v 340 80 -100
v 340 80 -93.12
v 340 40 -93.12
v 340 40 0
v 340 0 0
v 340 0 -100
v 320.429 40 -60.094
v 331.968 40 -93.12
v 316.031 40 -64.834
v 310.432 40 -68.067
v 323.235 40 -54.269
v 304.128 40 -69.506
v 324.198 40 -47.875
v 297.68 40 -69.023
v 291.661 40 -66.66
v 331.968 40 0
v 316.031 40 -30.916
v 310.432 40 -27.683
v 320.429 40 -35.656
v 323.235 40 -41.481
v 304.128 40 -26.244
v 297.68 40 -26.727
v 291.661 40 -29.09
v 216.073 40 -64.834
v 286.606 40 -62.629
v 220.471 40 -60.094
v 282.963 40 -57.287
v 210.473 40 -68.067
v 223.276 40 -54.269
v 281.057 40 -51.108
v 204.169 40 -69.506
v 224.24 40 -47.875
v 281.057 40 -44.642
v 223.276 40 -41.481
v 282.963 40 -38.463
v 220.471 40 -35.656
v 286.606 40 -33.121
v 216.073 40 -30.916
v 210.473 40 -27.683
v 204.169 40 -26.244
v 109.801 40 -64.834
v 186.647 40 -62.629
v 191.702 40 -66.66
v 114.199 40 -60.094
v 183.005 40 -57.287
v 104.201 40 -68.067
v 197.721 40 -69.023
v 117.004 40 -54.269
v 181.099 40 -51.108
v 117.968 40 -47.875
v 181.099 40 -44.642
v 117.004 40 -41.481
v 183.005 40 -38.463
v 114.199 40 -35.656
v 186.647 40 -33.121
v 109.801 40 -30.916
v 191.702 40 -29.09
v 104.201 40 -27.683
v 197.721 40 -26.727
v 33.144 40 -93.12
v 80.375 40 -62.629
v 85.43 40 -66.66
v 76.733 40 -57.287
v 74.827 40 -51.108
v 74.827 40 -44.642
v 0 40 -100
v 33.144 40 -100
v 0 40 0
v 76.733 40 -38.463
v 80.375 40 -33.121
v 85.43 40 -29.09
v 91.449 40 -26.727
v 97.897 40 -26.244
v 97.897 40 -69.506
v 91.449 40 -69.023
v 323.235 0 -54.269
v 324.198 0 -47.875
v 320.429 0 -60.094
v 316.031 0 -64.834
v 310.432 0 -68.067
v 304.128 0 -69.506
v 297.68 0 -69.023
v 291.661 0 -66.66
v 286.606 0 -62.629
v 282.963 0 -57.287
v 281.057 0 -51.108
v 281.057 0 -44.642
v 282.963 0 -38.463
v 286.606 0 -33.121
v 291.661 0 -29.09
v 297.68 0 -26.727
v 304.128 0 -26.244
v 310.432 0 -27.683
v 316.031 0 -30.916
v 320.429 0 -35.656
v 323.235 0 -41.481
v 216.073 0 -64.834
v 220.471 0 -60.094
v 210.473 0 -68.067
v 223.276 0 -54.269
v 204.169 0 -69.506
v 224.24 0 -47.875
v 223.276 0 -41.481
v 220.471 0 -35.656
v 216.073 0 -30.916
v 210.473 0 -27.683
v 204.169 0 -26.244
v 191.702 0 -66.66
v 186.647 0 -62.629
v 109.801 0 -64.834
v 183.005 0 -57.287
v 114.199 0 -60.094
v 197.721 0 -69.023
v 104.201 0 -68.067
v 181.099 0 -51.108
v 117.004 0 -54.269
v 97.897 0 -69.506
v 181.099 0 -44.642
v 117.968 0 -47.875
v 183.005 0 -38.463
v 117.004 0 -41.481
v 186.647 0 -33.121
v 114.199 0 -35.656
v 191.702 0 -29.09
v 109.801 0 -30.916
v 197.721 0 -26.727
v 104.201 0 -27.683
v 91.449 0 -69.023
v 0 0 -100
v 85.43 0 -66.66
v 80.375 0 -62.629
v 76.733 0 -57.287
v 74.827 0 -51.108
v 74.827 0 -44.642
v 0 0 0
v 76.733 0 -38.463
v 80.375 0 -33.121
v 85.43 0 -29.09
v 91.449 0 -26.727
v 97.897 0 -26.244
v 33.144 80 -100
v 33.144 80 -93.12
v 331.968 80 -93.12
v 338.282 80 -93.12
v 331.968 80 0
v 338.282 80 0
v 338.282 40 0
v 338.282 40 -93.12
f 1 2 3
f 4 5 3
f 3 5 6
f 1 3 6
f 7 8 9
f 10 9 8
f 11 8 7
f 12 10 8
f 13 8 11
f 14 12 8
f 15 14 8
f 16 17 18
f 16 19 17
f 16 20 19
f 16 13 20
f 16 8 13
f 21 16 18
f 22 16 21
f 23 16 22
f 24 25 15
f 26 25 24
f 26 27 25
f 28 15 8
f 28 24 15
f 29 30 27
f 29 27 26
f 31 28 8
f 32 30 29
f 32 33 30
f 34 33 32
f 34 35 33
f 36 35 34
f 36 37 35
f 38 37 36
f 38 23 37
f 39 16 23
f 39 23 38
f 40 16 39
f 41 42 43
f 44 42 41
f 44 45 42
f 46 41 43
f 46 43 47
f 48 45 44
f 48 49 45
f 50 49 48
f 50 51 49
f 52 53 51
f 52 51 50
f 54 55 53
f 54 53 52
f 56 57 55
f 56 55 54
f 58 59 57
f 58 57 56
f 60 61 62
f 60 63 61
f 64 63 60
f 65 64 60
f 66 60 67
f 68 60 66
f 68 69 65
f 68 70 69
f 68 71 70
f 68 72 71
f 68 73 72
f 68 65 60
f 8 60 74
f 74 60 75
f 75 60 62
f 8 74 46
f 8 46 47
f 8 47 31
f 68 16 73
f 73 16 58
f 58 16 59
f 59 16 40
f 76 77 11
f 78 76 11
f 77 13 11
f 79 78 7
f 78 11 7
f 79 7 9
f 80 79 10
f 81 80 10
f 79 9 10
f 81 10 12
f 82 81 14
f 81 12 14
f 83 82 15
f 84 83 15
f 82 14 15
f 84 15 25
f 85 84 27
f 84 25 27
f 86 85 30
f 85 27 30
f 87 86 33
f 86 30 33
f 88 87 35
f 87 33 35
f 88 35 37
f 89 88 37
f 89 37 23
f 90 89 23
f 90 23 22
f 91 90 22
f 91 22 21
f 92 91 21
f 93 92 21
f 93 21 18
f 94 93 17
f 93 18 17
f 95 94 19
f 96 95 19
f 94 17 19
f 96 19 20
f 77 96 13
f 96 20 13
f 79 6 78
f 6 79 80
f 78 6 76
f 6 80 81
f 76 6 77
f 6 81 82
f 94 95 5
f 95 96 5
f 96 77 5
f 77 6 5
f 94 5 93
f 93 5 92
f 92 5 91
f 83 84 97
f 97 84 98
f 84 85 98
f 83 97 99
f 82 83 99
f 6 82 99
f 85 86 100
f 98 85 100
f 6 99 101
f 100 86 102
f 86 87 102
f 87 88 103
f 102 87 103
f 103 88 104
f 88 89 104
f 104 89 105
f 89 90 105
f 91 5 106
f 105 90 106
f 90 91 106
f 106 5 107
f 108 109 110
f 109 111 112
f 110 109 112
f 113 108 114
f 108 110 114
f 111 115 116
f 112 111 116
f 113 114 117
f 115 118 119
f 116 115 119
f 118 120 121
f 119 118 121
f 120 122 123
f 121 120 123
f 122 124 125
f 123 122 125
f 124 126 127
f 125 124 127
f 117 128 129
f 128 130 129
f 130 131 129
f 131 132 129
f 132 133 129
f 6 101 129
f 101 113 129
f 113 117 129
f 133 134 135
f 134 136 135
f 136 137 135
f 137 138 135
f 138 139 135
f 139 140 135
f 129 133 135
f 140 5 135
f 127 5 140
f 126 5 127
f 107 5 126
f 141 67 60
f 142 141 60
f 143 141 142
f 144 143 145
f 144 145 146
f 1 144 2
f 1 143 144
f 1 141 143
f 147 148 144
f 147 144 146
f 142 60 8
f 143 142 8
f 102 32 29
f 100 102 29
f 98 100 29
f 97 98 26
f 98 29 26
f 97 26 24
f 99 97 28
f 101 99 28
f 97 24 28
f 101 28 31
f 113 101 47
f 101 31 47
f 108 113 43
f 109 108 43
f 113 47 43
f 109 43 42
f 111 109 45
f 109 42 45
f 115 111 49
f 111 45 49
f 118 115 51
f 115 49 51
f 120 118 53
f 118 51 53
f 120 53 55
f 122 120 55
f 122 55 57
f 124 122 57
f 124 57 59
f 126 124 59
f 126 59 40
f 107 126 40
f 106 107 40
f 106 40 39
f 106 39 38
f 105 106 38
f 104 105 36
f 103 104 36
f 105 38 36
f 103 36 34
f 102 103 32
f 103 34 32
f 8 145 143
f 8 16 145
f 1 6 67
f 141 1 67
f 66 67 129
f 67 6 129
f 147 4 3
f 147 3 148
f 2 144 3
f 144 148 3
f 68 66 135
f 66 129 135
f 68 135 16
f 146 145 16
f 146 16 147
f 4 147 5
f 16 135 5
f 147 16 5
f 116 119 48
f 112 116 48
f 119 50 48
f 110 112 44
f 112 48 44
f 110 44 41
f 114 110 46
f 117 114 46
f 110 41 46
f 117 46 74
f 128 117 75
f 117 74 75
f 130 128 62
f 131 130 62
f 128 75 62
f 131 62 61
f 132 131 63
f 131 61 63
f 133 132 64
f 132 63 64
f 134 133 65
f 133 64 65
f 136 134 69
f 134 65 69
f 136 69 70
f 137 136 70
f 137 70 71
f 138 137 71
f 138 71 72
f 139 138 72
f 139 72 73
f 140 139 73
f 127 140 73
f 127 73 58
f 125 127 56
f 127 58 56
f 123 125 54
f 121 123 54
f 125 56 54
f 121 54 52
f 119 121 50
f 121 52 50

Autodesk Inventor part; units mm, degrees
ref_plane "YZ Plane" through (0, 0, 0) normal (1, 0, 0) x (0, 1, 0)
ref_plane "XZ Plane" through (0, 0, 0) normal (0, 1, 0) x (-1, 0, 0)
ref_plane "XY Plane" through (0, 0, 0) normal (0, 0, 1) x (1, 0, 0)
sketch "Sketch1" plane through (0, 0, 0) normal (0, 1, 0) x (-1, 0, 0)
  line L0 (0, 0) -> (-340, 0)
  line L1 (-340, 0) -> (-340, -100)
  line L2 (-340, -100) -> (0, -100)
  line L3 (0, -100) -> (0, 0)
  dimension "d0" = 340
  dimension "d1" = 100
extrude "Extrusion1" add sketch "Sketch1" along normal blind 40
sketch "Sketch2" plane through (0, 40, 0) normal (0, 1, 0) x (1, 0, 0)
  circle A0 centre (302.5068, 47.875) radius 21.6916
  circle A1 centre (202.5481, 47.875) radius 21.6916
  circle A2 centre (96.2761, 47.875) radius 21.6916
  circle A3 centre (302.5068, 47.875) radius 21.6916
  point P0 (0, 0)
extrude "Extrusion2" cut sketch "Sketch2" against normal blind 500
sketch "Sketch3" plane through (0, 40, 0) normal (0, 1, 0) x (1, 0, 0)
  line L0 (340, 100) -> (0, 100) projected
  line L1 (33.1442, 93.1195) -> (340, 93.1195)
  line L2 (340, 93.1195) -> (340, 100)
  line L3 (340, 100) -> (33.1442, 100)
  line L4 (33.1442, 100) -> (33.1442, 93.1195)
  point P0 (0, 0)
extrude "Extrusion3" add sketch "Sketch3" along normal blind 40
sketch "Sketch4" plane through (0, 40, 0) normal (0, 1, 0) x (1, 0, 0)
  line L0 (340, 93.1195) -> (33.1442, 93.1195) projected
  line L1 (338.2816, 0) -> (331.9684, 0)
  line L2 (331.9684, 0) -> (331.9684, 93.1195)
  line L3 (331.9684, 93.1195) -> (338.2816, 93.1195)
  line L4 (338.2816, 93.1195) -> (338.2816, 0)
  point P0 (0, 0)
extrude "Extrusion4" add sketch "Sketch4" along normal blind 40
